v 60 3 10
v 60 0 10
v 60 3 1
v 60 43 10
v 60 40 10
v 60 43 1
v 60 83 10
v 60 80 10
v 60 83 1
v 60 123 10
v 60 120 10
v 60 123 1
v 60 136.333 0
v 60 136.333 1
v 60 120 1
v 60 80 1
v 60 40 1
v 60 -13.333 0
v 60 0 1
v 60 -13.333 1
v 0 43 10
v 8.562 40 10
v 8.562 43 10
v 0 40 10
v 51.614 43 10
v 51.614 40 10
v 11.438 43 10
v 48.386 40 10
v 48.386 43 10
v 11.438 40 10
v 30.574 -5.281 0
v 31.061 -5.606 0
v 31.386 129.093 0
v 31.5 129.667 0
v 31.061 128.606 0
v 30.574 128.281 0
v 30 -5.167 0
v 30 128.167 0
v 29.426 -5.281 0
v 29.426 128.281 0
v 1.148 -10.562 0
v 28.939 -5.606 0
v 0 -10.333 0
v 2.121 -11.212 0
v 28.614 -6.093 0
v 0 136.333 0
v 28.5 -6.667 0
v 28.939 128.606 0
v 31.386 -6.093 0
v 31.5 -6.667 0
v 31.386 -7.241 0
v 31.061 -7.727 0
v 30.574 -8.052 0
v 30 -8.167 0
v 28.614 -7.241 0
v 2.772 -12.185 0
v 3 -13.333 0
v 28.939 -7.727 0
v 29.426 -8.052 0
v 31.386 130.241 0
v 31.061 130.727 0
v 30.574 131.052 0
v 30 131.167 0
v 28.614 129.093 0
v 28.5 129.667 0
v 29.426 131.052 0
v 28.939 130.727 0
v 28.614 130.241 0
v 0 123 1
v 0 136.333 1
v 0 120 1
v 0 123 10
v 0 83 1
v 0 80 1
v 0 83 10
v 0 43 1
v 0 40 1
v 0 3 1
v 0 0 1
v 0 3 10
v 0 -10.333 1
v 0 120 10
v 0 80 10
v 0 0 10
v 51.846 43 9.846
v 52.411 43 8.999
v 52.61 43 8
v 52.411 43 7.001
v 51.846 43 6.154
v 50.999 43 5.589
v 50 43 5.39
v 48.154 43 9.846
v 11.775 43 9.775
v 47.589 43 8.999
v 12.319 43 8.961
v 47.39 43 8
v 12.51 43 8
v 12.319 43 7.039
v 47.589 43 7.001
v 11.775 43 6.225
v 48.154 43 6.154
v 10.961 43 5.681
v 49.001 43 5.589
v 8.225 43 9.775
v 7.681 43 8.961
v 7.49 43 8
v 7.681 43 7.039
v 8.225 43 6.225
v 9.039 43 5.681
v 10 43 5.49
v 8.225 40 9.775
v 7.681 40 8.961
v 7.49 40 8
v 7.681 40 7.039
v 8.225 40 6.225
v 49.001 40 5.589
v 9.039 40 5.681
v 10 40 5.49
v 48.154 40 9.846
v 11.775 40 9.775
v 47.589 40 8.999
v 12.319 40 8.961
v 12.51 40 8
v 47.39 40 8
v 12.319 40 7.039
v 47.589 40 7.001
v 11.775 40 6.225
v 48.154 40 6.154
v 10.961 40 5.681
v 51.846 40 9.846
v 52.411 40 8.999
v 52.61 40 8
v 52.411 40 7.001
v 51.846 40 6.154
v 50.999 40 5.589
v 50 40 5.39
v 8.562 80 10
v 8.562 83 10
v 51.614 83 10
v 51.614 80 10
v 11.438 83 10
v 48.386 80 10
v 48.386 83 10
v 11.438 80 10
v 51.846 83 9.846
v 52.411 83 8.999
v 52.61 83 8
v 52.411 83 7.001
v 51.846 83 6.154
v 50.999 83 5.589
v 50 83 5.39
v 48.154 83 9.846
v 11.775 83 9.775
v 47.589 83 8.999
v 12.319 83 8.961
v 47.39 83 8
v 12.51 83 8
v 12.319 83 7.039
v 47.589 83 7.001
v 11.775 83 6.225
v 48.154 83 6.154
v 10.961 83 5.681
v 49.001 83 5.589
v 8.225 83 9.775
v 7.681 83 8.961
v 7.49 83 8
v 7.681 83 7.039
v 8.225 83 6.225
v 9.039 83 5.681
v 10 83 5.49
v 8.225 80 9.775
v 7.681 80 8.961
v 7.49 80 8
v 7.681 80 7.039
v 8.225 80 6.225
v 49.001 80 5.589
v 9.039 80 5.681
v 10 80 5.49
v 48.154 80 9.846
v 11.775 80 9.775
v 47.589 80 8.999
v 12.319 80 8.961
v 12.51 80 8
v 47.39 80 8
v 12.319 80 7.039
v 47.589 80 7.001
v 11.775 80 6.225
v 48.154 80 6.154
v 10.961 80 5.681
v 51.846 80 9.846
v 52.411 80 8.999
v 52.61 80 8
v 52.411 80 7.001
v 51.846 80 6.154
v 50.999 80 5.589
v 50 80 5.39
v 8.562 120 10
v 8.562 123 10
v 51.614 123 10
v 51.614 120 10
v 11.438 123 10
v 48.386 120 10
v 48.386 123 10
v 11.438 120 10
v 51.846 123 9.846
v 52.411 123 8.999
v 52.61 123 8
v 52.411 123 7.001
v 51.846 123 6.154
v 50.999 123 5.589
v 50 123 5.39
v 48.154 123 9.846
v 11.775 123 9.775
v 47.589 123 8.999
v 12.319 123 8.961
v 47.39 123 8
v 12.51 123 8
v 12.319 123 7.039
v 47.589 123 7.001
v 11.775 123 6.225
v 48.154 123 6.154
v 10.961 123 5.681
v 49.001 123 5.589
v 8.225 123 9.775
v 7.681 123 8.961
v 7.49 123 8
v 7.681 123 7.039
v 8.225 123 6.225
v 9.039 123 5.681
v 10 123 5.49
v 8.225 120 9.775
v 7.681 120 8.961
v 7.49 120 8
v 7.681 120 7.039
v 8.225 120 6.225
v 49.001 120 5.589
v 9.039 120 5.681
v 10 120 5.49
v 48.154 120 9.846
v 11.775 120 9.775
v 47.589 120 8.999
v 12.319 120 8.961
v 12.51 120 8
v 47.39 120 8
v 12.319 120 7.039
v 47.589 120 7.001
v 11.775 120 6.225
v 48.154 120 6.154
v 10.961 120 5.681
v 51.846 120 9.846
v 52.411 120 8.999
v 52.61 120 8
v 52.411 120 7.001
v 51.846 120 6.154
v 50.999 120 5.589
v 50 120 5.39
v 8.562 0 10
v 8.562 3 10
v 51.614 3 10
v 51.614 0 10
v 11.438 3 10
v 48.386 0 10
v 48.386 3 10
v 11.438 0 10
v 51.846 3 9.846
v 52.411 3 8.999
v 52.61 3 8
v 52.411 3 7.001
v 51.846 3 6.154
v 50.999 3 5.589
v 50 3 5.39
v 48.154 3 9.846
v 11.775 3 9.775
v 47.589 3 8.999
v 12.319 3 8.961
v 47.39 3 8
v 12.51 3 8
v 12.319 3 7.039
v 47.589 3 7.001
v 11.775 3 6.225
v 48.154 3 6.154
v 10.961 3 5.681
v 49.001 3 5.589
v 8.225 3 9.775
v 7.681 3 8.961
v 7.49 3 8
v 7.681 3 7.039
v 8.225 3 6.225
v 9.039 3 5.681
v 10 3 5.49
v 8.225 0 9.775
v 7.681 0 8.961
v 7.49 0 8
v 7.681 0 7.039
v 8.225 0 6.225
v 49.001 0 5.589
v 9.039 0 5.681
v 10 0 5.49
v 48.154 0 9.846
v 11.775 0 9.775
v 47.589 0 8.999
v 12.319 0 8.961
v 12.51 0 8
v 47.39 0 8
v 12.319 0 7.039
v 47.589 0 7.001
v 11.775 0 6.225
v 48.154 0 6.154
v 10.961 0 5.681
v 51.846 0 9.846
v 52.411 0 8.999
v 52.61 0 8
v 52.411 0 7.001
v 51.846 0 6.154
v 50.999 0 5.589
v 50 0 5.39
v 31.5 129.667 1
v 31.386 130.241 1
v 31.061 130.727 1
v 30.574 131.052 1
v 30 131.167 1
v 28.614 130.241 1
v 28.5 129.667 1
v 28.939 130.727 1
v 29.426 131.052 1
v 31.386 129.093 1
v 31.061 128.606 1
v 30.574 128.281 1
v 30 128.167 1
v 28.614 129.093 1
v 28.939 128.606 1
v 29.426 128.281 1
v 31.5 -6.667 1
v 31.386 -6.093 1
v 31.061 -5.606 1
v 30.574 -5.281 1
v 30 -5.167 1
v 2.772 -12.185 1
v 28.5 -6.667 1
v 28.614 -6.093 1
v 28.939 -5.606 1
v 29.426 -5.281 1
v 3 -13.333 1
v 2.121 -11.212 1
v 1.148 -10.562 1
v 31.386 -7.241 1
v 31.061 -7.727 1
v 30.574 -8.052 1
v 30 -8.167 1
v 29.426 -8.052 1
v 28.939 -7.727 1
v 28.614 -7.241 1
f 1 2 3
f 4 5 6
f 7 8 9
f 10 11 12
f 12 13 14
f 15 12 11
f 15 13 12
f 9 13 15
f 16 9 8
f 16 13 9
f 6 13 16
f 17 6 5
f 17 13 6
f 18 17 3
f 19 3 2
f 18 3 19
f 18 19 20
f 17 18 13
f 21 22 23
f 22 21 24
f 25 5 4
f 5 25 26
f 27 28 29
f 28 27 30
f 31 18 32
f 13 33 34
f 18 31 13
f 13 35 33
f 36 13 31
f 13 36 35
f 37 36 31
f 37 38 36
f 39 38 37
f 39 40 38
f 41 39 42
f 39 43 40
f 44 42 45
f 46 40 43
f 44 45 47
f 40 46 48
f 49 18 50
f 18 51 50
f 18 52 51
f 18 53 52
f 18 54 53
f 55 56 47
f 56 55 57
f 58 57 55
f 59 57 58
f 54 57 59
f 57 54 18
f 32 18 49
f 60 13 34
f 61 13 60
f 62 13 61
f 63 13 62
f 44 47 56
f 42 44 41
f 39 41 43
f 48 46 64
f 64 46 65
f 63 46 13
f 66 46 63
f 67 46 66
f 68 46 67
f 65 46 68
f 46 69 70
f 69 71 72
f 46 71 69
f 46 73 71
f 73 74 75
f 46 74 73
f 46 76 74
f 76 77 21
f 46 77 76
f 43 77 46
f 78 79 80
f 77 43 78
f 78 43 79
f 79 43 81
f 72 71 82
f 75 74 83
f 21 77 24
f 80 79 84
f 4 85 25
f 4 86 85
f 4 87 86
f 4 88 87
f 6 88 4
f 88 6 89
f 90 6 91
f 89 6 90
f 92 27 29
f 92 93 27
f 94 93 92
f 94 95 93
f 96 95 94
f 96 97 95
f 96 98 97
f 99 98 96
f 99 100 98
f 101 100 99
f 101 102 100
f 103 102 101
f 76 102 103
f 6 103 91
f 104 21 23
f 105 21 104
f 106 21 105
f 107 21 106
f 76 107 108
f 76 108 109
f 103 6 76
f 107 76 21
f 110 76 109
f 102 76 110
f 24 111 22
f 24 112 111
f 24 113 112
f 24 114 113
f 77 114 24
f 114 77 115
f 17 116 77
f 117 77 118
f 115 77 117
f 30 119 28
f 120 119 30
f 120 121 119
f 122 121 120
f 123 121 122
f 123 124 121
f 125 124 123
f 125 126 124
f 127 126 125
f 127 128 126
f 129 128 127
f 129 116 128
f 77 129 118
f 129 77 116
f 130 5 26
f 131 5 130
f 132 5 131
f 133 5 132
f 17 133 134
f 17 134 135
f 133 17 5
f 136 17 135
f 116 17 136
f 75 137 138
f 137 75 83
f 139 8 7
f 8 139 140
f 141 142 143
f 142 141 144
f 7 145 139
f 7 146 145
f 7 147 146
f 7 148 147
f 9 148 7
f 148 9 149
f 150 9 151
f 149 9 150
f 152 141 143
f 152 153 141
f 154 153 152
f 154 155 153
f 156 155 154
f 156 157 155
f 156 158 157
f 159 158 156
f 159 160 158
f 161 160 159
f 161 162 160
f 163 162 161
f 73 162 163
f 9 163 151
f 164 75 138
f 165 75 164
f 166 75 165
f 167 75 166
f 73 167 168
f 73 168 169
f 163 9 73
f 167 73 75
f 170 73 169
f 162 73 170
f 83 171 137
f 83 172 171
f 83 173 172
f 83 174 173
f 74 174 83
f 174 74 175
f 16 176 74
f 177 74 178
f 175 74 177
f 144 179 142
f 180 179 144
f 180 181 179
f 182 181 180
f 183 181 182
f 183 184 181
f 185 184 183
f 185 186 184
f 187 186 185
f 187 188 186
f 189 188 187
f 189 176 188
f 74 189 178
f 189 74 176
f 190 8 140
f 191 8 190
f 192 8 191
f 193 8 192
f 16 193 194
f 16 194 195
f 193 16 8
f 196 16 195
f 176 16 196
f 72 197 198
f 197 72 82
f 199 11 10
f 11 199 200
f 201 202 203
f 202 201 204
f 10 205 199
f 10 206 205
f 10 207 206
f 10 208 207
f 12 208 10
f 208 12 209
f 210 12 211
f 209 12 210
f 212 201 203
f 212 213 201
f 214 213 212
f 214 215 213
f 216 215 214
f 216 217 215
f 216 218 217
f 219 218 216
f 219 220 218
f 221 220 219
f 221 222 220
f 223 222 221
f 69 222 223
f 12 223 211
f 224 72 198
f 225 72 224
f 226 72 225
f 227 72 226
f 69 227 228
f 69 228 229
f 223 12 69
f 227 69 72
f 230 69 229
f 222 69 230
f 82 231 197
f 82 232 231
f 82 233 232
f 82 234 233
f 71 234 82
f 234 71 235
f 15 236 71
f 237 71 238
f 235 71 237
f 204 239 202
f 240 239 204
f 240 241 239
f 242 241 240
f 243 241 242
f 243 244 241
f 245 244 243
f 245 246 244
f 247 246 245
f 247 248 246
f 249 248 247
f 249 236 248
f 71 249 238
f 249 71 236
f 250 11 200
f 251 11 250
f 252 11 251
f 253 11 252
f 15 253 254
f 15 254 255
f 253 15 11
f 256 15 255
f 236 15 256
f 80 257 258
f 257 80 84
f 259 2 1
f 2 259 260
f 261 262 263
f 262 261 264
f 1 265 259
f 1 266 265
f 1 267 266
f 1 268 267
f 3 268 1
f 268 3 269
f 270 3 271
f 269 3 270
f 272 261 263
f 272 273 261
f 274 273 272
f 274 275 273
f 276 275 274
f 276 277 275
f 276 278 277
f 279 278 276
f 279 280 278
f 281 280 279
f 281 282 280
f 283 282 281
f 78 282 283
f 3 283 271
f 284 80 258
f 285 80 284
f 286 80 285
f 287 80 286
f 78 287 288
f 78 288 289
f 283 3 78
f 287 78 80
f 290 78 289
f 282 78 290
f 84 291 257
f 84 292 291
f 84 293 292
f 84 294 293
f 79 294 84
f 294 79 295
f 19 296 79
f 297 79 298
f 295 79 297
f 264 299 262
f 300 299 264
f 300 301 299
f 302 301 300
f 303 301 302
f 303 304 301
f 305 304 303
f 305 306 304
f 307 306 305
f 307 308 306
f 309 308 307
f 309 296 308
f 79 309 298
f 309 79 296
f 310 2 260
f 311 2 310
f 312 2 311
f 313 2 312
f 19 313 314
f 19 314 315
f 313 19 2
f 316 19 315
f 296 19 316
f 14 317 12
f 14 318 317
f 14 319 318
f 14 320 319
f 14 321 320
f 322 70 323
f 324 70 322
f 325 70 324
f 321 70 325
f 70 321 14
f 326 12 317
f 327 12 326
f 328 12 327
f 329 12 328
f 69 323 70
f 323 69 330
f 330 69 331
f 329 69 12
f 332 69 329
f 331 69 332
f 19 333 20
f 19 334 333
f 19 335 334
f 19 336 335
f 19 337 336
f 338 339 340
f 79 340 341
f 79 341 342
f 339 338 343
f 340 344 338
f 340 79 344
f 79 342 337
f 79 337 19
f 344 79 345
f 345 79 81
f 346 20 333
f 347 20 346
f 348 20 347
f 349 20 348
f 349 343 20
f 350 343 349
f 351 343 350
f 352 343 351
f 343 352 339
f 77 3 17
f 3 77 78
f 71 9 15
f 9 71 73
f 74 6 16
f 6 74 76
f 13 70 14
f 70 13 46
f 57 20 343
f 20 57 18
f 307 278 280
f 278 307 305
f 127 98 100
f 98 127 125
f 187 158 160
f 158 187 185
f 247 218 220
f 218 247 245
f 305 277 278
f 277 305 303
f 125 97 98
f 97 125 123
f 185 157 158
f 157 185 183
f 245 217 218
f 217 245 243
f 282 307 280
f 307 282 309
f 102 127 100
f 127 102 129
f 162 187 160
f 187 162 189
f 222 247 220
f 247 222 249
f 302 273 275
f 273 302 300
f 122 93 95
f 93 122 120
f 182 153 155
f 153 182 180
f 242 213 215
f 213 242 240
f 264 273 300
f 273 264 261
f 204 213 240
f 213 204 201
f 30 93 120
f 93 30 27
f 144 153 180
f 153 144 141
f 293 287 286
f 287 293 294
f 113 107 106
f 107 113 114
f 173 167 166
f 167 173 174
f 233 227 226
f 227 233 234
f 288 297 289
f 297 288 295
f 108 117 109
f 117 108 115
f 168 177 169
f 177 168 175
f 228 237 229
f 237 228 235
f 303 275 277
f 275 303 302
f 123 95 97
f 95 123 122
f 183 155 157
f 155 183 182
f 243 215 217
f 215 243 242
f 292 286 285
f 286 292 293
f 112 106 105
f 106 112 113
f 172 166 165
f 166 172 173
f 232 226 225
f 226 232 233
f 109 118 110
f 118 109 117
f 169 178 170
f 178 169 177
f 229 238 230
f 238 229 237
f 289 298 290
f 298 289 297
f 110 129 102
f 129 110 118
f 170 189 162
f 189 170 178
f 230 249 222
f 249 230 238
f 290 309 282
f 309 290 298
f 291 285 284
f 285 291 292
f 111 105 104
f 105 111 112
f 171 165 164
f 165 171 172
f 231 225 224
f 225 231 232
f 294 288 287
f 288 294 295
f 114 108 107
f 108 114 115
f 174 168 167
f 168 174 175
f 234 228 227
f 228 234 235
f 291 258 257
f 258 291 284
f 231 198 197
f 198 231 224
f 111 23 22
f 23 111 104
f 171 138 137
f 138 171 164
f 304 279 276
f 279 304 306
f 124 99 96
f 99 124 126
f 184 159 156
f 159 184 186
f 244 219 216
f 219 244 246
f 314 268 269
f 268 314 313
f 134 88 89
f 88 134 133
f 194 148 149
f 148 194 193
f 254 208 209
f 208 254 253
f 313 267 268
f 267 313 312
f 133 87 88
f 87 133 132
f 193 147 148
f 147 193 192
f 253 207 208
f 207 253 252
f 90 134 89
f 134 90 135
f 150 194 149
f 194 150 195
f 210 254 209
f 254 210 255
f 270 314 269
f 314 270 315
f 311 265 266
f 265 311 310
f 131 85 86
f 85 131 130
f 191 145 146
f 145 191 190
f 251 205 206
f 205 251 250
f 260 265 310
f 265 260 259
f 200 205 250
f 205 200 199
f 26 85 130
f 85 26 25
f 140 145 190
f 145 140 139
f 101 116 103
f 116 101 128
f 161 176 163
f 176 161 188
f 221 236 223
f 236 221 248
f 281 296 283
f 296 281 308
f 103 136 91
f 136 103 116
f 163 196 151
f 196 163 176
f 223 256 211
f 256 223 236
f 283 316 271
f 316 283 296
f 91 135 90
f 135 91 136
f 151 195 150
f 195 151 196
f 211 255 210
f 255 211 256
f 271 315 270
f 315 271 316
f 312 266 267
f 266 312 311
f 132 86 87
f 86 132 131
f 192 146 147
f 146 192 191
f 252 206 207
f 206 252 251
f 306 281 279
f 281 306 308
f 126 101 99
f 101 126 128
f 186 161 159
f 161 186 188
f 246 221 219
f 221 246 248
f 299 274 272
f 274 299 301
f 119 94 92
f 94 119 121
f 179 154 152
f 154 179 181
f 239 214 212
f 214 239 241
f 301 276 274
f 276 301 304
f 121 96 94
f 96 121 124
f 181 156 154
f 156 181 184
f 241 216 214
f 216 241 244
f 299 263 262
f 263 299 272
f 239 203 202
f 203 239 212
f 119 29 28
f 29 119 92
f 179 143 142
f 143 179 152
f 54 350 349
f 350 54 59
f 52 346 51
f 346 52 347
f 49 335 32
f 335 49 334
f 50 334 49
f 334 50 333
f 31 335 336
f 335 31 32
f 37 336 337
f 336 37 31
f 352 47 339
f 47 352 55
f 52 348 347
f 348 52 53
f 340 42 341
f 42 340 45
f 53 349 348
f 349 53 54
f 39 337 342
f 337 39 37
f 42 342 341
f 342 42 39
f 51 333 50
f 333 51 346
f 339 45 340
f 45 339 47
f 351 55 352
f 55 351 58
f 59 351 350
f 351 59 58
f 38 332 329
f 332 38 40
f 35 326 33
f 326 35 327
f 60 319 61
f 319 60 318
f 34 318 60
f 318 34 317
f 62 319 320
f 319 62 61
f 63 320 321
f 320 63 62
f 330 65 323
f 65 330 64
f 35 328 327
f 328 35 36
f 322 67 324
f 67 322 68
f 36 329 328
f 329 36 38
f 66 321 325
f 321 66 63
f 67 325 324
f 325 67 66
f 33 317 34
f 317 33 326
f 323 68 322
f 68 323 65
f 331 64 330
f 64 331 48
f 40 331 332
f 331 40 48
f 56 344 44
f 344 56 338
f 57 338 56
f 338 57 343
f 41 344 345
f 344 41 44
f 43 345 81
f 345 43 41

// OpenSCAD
// Wall Parameters
wallCount = 4; // Total number of vertical walls
wallWidth = 60;
wallHeight = 10;
wallDepth = 3;
wallSeparation = 40;
floorHeight = 1;

// Hole Parameters
holeR = (4.92 / 2.0) + 0.05;
holeL = (wallSeparation+wallDepth+wallDepth)*wallCount + 2;
holeXOffset = (wallWidth - wallSeparation) / 2;
holeZoffset = 8; // How high should the LED holes be?
holeRightFudge = 0.10; // my printer prints this hole too small

// Mounting wings Parameters
mountWing = wallSeparation/3; // How deep
mountingScrewHoleR=1.5;

// Computed variables
wallMax = wallCount - 1;

$fn=16; // higher # means smoother cylinders

module Wall()
{
	union()
	{
		// Front Wall -- Always printed
		cube([wallWidth, wallDepth, wallHeight]);

		// Back Walls -- Print as many as requested
		for (n=[1:wallMax])
		{
			translate([0,wallSeparation*n,0]) cube([wallWidth, wallDepth, wallHeight]);
		}

		// Floor and mounting wings
		translate([0,-mountWing,0])
		cube([wallWidth, wallMax*wallSeparation + wallDepth + 2*mountWing, floorHeight]);
	}
}

module LEDHolePuncher()
{
	// Left hole
	translate([holeXOffset,-wallDepth,holeZoffset])
		rotate([-90,0,0])
			cylinder(h=holeL, r=holeR);

	// Right hole
	translate([wallWidth-holeXOffset,-wallDepth,holeZoffset])
		rotate([-90,0,0])
			cylinder(h=holeL, r=holeR+holeRightFudge);
}

module MountingHoles()
{
	// Front mount holes
	translate([wallWidth/2,-wallSeparation/6,0])
		cylinder(h=floorHeight,r=mountingScrewHoleR);

	// Rear mount holes
	translate([wallWidth/2,(wallMax*wallSeparation)+ wallDepth +(wallSeparation/6),0])
		cylinder(h=floorHeight,r=mountingScrewHoleR);
}

module Indicator()
{
	translate([0,-wallSeparation/3,0])
		cylinder(h=floorHeight,r=3);
}

module Jig()
{
	difference()
	{
		Wall();
		LEDHolePuncher();
		MountingHoles();
		Indicator(); // Indicate which side is nearest origin in case we need to make adjustments then we'll know which hole is which.
	}
}

Jig();
